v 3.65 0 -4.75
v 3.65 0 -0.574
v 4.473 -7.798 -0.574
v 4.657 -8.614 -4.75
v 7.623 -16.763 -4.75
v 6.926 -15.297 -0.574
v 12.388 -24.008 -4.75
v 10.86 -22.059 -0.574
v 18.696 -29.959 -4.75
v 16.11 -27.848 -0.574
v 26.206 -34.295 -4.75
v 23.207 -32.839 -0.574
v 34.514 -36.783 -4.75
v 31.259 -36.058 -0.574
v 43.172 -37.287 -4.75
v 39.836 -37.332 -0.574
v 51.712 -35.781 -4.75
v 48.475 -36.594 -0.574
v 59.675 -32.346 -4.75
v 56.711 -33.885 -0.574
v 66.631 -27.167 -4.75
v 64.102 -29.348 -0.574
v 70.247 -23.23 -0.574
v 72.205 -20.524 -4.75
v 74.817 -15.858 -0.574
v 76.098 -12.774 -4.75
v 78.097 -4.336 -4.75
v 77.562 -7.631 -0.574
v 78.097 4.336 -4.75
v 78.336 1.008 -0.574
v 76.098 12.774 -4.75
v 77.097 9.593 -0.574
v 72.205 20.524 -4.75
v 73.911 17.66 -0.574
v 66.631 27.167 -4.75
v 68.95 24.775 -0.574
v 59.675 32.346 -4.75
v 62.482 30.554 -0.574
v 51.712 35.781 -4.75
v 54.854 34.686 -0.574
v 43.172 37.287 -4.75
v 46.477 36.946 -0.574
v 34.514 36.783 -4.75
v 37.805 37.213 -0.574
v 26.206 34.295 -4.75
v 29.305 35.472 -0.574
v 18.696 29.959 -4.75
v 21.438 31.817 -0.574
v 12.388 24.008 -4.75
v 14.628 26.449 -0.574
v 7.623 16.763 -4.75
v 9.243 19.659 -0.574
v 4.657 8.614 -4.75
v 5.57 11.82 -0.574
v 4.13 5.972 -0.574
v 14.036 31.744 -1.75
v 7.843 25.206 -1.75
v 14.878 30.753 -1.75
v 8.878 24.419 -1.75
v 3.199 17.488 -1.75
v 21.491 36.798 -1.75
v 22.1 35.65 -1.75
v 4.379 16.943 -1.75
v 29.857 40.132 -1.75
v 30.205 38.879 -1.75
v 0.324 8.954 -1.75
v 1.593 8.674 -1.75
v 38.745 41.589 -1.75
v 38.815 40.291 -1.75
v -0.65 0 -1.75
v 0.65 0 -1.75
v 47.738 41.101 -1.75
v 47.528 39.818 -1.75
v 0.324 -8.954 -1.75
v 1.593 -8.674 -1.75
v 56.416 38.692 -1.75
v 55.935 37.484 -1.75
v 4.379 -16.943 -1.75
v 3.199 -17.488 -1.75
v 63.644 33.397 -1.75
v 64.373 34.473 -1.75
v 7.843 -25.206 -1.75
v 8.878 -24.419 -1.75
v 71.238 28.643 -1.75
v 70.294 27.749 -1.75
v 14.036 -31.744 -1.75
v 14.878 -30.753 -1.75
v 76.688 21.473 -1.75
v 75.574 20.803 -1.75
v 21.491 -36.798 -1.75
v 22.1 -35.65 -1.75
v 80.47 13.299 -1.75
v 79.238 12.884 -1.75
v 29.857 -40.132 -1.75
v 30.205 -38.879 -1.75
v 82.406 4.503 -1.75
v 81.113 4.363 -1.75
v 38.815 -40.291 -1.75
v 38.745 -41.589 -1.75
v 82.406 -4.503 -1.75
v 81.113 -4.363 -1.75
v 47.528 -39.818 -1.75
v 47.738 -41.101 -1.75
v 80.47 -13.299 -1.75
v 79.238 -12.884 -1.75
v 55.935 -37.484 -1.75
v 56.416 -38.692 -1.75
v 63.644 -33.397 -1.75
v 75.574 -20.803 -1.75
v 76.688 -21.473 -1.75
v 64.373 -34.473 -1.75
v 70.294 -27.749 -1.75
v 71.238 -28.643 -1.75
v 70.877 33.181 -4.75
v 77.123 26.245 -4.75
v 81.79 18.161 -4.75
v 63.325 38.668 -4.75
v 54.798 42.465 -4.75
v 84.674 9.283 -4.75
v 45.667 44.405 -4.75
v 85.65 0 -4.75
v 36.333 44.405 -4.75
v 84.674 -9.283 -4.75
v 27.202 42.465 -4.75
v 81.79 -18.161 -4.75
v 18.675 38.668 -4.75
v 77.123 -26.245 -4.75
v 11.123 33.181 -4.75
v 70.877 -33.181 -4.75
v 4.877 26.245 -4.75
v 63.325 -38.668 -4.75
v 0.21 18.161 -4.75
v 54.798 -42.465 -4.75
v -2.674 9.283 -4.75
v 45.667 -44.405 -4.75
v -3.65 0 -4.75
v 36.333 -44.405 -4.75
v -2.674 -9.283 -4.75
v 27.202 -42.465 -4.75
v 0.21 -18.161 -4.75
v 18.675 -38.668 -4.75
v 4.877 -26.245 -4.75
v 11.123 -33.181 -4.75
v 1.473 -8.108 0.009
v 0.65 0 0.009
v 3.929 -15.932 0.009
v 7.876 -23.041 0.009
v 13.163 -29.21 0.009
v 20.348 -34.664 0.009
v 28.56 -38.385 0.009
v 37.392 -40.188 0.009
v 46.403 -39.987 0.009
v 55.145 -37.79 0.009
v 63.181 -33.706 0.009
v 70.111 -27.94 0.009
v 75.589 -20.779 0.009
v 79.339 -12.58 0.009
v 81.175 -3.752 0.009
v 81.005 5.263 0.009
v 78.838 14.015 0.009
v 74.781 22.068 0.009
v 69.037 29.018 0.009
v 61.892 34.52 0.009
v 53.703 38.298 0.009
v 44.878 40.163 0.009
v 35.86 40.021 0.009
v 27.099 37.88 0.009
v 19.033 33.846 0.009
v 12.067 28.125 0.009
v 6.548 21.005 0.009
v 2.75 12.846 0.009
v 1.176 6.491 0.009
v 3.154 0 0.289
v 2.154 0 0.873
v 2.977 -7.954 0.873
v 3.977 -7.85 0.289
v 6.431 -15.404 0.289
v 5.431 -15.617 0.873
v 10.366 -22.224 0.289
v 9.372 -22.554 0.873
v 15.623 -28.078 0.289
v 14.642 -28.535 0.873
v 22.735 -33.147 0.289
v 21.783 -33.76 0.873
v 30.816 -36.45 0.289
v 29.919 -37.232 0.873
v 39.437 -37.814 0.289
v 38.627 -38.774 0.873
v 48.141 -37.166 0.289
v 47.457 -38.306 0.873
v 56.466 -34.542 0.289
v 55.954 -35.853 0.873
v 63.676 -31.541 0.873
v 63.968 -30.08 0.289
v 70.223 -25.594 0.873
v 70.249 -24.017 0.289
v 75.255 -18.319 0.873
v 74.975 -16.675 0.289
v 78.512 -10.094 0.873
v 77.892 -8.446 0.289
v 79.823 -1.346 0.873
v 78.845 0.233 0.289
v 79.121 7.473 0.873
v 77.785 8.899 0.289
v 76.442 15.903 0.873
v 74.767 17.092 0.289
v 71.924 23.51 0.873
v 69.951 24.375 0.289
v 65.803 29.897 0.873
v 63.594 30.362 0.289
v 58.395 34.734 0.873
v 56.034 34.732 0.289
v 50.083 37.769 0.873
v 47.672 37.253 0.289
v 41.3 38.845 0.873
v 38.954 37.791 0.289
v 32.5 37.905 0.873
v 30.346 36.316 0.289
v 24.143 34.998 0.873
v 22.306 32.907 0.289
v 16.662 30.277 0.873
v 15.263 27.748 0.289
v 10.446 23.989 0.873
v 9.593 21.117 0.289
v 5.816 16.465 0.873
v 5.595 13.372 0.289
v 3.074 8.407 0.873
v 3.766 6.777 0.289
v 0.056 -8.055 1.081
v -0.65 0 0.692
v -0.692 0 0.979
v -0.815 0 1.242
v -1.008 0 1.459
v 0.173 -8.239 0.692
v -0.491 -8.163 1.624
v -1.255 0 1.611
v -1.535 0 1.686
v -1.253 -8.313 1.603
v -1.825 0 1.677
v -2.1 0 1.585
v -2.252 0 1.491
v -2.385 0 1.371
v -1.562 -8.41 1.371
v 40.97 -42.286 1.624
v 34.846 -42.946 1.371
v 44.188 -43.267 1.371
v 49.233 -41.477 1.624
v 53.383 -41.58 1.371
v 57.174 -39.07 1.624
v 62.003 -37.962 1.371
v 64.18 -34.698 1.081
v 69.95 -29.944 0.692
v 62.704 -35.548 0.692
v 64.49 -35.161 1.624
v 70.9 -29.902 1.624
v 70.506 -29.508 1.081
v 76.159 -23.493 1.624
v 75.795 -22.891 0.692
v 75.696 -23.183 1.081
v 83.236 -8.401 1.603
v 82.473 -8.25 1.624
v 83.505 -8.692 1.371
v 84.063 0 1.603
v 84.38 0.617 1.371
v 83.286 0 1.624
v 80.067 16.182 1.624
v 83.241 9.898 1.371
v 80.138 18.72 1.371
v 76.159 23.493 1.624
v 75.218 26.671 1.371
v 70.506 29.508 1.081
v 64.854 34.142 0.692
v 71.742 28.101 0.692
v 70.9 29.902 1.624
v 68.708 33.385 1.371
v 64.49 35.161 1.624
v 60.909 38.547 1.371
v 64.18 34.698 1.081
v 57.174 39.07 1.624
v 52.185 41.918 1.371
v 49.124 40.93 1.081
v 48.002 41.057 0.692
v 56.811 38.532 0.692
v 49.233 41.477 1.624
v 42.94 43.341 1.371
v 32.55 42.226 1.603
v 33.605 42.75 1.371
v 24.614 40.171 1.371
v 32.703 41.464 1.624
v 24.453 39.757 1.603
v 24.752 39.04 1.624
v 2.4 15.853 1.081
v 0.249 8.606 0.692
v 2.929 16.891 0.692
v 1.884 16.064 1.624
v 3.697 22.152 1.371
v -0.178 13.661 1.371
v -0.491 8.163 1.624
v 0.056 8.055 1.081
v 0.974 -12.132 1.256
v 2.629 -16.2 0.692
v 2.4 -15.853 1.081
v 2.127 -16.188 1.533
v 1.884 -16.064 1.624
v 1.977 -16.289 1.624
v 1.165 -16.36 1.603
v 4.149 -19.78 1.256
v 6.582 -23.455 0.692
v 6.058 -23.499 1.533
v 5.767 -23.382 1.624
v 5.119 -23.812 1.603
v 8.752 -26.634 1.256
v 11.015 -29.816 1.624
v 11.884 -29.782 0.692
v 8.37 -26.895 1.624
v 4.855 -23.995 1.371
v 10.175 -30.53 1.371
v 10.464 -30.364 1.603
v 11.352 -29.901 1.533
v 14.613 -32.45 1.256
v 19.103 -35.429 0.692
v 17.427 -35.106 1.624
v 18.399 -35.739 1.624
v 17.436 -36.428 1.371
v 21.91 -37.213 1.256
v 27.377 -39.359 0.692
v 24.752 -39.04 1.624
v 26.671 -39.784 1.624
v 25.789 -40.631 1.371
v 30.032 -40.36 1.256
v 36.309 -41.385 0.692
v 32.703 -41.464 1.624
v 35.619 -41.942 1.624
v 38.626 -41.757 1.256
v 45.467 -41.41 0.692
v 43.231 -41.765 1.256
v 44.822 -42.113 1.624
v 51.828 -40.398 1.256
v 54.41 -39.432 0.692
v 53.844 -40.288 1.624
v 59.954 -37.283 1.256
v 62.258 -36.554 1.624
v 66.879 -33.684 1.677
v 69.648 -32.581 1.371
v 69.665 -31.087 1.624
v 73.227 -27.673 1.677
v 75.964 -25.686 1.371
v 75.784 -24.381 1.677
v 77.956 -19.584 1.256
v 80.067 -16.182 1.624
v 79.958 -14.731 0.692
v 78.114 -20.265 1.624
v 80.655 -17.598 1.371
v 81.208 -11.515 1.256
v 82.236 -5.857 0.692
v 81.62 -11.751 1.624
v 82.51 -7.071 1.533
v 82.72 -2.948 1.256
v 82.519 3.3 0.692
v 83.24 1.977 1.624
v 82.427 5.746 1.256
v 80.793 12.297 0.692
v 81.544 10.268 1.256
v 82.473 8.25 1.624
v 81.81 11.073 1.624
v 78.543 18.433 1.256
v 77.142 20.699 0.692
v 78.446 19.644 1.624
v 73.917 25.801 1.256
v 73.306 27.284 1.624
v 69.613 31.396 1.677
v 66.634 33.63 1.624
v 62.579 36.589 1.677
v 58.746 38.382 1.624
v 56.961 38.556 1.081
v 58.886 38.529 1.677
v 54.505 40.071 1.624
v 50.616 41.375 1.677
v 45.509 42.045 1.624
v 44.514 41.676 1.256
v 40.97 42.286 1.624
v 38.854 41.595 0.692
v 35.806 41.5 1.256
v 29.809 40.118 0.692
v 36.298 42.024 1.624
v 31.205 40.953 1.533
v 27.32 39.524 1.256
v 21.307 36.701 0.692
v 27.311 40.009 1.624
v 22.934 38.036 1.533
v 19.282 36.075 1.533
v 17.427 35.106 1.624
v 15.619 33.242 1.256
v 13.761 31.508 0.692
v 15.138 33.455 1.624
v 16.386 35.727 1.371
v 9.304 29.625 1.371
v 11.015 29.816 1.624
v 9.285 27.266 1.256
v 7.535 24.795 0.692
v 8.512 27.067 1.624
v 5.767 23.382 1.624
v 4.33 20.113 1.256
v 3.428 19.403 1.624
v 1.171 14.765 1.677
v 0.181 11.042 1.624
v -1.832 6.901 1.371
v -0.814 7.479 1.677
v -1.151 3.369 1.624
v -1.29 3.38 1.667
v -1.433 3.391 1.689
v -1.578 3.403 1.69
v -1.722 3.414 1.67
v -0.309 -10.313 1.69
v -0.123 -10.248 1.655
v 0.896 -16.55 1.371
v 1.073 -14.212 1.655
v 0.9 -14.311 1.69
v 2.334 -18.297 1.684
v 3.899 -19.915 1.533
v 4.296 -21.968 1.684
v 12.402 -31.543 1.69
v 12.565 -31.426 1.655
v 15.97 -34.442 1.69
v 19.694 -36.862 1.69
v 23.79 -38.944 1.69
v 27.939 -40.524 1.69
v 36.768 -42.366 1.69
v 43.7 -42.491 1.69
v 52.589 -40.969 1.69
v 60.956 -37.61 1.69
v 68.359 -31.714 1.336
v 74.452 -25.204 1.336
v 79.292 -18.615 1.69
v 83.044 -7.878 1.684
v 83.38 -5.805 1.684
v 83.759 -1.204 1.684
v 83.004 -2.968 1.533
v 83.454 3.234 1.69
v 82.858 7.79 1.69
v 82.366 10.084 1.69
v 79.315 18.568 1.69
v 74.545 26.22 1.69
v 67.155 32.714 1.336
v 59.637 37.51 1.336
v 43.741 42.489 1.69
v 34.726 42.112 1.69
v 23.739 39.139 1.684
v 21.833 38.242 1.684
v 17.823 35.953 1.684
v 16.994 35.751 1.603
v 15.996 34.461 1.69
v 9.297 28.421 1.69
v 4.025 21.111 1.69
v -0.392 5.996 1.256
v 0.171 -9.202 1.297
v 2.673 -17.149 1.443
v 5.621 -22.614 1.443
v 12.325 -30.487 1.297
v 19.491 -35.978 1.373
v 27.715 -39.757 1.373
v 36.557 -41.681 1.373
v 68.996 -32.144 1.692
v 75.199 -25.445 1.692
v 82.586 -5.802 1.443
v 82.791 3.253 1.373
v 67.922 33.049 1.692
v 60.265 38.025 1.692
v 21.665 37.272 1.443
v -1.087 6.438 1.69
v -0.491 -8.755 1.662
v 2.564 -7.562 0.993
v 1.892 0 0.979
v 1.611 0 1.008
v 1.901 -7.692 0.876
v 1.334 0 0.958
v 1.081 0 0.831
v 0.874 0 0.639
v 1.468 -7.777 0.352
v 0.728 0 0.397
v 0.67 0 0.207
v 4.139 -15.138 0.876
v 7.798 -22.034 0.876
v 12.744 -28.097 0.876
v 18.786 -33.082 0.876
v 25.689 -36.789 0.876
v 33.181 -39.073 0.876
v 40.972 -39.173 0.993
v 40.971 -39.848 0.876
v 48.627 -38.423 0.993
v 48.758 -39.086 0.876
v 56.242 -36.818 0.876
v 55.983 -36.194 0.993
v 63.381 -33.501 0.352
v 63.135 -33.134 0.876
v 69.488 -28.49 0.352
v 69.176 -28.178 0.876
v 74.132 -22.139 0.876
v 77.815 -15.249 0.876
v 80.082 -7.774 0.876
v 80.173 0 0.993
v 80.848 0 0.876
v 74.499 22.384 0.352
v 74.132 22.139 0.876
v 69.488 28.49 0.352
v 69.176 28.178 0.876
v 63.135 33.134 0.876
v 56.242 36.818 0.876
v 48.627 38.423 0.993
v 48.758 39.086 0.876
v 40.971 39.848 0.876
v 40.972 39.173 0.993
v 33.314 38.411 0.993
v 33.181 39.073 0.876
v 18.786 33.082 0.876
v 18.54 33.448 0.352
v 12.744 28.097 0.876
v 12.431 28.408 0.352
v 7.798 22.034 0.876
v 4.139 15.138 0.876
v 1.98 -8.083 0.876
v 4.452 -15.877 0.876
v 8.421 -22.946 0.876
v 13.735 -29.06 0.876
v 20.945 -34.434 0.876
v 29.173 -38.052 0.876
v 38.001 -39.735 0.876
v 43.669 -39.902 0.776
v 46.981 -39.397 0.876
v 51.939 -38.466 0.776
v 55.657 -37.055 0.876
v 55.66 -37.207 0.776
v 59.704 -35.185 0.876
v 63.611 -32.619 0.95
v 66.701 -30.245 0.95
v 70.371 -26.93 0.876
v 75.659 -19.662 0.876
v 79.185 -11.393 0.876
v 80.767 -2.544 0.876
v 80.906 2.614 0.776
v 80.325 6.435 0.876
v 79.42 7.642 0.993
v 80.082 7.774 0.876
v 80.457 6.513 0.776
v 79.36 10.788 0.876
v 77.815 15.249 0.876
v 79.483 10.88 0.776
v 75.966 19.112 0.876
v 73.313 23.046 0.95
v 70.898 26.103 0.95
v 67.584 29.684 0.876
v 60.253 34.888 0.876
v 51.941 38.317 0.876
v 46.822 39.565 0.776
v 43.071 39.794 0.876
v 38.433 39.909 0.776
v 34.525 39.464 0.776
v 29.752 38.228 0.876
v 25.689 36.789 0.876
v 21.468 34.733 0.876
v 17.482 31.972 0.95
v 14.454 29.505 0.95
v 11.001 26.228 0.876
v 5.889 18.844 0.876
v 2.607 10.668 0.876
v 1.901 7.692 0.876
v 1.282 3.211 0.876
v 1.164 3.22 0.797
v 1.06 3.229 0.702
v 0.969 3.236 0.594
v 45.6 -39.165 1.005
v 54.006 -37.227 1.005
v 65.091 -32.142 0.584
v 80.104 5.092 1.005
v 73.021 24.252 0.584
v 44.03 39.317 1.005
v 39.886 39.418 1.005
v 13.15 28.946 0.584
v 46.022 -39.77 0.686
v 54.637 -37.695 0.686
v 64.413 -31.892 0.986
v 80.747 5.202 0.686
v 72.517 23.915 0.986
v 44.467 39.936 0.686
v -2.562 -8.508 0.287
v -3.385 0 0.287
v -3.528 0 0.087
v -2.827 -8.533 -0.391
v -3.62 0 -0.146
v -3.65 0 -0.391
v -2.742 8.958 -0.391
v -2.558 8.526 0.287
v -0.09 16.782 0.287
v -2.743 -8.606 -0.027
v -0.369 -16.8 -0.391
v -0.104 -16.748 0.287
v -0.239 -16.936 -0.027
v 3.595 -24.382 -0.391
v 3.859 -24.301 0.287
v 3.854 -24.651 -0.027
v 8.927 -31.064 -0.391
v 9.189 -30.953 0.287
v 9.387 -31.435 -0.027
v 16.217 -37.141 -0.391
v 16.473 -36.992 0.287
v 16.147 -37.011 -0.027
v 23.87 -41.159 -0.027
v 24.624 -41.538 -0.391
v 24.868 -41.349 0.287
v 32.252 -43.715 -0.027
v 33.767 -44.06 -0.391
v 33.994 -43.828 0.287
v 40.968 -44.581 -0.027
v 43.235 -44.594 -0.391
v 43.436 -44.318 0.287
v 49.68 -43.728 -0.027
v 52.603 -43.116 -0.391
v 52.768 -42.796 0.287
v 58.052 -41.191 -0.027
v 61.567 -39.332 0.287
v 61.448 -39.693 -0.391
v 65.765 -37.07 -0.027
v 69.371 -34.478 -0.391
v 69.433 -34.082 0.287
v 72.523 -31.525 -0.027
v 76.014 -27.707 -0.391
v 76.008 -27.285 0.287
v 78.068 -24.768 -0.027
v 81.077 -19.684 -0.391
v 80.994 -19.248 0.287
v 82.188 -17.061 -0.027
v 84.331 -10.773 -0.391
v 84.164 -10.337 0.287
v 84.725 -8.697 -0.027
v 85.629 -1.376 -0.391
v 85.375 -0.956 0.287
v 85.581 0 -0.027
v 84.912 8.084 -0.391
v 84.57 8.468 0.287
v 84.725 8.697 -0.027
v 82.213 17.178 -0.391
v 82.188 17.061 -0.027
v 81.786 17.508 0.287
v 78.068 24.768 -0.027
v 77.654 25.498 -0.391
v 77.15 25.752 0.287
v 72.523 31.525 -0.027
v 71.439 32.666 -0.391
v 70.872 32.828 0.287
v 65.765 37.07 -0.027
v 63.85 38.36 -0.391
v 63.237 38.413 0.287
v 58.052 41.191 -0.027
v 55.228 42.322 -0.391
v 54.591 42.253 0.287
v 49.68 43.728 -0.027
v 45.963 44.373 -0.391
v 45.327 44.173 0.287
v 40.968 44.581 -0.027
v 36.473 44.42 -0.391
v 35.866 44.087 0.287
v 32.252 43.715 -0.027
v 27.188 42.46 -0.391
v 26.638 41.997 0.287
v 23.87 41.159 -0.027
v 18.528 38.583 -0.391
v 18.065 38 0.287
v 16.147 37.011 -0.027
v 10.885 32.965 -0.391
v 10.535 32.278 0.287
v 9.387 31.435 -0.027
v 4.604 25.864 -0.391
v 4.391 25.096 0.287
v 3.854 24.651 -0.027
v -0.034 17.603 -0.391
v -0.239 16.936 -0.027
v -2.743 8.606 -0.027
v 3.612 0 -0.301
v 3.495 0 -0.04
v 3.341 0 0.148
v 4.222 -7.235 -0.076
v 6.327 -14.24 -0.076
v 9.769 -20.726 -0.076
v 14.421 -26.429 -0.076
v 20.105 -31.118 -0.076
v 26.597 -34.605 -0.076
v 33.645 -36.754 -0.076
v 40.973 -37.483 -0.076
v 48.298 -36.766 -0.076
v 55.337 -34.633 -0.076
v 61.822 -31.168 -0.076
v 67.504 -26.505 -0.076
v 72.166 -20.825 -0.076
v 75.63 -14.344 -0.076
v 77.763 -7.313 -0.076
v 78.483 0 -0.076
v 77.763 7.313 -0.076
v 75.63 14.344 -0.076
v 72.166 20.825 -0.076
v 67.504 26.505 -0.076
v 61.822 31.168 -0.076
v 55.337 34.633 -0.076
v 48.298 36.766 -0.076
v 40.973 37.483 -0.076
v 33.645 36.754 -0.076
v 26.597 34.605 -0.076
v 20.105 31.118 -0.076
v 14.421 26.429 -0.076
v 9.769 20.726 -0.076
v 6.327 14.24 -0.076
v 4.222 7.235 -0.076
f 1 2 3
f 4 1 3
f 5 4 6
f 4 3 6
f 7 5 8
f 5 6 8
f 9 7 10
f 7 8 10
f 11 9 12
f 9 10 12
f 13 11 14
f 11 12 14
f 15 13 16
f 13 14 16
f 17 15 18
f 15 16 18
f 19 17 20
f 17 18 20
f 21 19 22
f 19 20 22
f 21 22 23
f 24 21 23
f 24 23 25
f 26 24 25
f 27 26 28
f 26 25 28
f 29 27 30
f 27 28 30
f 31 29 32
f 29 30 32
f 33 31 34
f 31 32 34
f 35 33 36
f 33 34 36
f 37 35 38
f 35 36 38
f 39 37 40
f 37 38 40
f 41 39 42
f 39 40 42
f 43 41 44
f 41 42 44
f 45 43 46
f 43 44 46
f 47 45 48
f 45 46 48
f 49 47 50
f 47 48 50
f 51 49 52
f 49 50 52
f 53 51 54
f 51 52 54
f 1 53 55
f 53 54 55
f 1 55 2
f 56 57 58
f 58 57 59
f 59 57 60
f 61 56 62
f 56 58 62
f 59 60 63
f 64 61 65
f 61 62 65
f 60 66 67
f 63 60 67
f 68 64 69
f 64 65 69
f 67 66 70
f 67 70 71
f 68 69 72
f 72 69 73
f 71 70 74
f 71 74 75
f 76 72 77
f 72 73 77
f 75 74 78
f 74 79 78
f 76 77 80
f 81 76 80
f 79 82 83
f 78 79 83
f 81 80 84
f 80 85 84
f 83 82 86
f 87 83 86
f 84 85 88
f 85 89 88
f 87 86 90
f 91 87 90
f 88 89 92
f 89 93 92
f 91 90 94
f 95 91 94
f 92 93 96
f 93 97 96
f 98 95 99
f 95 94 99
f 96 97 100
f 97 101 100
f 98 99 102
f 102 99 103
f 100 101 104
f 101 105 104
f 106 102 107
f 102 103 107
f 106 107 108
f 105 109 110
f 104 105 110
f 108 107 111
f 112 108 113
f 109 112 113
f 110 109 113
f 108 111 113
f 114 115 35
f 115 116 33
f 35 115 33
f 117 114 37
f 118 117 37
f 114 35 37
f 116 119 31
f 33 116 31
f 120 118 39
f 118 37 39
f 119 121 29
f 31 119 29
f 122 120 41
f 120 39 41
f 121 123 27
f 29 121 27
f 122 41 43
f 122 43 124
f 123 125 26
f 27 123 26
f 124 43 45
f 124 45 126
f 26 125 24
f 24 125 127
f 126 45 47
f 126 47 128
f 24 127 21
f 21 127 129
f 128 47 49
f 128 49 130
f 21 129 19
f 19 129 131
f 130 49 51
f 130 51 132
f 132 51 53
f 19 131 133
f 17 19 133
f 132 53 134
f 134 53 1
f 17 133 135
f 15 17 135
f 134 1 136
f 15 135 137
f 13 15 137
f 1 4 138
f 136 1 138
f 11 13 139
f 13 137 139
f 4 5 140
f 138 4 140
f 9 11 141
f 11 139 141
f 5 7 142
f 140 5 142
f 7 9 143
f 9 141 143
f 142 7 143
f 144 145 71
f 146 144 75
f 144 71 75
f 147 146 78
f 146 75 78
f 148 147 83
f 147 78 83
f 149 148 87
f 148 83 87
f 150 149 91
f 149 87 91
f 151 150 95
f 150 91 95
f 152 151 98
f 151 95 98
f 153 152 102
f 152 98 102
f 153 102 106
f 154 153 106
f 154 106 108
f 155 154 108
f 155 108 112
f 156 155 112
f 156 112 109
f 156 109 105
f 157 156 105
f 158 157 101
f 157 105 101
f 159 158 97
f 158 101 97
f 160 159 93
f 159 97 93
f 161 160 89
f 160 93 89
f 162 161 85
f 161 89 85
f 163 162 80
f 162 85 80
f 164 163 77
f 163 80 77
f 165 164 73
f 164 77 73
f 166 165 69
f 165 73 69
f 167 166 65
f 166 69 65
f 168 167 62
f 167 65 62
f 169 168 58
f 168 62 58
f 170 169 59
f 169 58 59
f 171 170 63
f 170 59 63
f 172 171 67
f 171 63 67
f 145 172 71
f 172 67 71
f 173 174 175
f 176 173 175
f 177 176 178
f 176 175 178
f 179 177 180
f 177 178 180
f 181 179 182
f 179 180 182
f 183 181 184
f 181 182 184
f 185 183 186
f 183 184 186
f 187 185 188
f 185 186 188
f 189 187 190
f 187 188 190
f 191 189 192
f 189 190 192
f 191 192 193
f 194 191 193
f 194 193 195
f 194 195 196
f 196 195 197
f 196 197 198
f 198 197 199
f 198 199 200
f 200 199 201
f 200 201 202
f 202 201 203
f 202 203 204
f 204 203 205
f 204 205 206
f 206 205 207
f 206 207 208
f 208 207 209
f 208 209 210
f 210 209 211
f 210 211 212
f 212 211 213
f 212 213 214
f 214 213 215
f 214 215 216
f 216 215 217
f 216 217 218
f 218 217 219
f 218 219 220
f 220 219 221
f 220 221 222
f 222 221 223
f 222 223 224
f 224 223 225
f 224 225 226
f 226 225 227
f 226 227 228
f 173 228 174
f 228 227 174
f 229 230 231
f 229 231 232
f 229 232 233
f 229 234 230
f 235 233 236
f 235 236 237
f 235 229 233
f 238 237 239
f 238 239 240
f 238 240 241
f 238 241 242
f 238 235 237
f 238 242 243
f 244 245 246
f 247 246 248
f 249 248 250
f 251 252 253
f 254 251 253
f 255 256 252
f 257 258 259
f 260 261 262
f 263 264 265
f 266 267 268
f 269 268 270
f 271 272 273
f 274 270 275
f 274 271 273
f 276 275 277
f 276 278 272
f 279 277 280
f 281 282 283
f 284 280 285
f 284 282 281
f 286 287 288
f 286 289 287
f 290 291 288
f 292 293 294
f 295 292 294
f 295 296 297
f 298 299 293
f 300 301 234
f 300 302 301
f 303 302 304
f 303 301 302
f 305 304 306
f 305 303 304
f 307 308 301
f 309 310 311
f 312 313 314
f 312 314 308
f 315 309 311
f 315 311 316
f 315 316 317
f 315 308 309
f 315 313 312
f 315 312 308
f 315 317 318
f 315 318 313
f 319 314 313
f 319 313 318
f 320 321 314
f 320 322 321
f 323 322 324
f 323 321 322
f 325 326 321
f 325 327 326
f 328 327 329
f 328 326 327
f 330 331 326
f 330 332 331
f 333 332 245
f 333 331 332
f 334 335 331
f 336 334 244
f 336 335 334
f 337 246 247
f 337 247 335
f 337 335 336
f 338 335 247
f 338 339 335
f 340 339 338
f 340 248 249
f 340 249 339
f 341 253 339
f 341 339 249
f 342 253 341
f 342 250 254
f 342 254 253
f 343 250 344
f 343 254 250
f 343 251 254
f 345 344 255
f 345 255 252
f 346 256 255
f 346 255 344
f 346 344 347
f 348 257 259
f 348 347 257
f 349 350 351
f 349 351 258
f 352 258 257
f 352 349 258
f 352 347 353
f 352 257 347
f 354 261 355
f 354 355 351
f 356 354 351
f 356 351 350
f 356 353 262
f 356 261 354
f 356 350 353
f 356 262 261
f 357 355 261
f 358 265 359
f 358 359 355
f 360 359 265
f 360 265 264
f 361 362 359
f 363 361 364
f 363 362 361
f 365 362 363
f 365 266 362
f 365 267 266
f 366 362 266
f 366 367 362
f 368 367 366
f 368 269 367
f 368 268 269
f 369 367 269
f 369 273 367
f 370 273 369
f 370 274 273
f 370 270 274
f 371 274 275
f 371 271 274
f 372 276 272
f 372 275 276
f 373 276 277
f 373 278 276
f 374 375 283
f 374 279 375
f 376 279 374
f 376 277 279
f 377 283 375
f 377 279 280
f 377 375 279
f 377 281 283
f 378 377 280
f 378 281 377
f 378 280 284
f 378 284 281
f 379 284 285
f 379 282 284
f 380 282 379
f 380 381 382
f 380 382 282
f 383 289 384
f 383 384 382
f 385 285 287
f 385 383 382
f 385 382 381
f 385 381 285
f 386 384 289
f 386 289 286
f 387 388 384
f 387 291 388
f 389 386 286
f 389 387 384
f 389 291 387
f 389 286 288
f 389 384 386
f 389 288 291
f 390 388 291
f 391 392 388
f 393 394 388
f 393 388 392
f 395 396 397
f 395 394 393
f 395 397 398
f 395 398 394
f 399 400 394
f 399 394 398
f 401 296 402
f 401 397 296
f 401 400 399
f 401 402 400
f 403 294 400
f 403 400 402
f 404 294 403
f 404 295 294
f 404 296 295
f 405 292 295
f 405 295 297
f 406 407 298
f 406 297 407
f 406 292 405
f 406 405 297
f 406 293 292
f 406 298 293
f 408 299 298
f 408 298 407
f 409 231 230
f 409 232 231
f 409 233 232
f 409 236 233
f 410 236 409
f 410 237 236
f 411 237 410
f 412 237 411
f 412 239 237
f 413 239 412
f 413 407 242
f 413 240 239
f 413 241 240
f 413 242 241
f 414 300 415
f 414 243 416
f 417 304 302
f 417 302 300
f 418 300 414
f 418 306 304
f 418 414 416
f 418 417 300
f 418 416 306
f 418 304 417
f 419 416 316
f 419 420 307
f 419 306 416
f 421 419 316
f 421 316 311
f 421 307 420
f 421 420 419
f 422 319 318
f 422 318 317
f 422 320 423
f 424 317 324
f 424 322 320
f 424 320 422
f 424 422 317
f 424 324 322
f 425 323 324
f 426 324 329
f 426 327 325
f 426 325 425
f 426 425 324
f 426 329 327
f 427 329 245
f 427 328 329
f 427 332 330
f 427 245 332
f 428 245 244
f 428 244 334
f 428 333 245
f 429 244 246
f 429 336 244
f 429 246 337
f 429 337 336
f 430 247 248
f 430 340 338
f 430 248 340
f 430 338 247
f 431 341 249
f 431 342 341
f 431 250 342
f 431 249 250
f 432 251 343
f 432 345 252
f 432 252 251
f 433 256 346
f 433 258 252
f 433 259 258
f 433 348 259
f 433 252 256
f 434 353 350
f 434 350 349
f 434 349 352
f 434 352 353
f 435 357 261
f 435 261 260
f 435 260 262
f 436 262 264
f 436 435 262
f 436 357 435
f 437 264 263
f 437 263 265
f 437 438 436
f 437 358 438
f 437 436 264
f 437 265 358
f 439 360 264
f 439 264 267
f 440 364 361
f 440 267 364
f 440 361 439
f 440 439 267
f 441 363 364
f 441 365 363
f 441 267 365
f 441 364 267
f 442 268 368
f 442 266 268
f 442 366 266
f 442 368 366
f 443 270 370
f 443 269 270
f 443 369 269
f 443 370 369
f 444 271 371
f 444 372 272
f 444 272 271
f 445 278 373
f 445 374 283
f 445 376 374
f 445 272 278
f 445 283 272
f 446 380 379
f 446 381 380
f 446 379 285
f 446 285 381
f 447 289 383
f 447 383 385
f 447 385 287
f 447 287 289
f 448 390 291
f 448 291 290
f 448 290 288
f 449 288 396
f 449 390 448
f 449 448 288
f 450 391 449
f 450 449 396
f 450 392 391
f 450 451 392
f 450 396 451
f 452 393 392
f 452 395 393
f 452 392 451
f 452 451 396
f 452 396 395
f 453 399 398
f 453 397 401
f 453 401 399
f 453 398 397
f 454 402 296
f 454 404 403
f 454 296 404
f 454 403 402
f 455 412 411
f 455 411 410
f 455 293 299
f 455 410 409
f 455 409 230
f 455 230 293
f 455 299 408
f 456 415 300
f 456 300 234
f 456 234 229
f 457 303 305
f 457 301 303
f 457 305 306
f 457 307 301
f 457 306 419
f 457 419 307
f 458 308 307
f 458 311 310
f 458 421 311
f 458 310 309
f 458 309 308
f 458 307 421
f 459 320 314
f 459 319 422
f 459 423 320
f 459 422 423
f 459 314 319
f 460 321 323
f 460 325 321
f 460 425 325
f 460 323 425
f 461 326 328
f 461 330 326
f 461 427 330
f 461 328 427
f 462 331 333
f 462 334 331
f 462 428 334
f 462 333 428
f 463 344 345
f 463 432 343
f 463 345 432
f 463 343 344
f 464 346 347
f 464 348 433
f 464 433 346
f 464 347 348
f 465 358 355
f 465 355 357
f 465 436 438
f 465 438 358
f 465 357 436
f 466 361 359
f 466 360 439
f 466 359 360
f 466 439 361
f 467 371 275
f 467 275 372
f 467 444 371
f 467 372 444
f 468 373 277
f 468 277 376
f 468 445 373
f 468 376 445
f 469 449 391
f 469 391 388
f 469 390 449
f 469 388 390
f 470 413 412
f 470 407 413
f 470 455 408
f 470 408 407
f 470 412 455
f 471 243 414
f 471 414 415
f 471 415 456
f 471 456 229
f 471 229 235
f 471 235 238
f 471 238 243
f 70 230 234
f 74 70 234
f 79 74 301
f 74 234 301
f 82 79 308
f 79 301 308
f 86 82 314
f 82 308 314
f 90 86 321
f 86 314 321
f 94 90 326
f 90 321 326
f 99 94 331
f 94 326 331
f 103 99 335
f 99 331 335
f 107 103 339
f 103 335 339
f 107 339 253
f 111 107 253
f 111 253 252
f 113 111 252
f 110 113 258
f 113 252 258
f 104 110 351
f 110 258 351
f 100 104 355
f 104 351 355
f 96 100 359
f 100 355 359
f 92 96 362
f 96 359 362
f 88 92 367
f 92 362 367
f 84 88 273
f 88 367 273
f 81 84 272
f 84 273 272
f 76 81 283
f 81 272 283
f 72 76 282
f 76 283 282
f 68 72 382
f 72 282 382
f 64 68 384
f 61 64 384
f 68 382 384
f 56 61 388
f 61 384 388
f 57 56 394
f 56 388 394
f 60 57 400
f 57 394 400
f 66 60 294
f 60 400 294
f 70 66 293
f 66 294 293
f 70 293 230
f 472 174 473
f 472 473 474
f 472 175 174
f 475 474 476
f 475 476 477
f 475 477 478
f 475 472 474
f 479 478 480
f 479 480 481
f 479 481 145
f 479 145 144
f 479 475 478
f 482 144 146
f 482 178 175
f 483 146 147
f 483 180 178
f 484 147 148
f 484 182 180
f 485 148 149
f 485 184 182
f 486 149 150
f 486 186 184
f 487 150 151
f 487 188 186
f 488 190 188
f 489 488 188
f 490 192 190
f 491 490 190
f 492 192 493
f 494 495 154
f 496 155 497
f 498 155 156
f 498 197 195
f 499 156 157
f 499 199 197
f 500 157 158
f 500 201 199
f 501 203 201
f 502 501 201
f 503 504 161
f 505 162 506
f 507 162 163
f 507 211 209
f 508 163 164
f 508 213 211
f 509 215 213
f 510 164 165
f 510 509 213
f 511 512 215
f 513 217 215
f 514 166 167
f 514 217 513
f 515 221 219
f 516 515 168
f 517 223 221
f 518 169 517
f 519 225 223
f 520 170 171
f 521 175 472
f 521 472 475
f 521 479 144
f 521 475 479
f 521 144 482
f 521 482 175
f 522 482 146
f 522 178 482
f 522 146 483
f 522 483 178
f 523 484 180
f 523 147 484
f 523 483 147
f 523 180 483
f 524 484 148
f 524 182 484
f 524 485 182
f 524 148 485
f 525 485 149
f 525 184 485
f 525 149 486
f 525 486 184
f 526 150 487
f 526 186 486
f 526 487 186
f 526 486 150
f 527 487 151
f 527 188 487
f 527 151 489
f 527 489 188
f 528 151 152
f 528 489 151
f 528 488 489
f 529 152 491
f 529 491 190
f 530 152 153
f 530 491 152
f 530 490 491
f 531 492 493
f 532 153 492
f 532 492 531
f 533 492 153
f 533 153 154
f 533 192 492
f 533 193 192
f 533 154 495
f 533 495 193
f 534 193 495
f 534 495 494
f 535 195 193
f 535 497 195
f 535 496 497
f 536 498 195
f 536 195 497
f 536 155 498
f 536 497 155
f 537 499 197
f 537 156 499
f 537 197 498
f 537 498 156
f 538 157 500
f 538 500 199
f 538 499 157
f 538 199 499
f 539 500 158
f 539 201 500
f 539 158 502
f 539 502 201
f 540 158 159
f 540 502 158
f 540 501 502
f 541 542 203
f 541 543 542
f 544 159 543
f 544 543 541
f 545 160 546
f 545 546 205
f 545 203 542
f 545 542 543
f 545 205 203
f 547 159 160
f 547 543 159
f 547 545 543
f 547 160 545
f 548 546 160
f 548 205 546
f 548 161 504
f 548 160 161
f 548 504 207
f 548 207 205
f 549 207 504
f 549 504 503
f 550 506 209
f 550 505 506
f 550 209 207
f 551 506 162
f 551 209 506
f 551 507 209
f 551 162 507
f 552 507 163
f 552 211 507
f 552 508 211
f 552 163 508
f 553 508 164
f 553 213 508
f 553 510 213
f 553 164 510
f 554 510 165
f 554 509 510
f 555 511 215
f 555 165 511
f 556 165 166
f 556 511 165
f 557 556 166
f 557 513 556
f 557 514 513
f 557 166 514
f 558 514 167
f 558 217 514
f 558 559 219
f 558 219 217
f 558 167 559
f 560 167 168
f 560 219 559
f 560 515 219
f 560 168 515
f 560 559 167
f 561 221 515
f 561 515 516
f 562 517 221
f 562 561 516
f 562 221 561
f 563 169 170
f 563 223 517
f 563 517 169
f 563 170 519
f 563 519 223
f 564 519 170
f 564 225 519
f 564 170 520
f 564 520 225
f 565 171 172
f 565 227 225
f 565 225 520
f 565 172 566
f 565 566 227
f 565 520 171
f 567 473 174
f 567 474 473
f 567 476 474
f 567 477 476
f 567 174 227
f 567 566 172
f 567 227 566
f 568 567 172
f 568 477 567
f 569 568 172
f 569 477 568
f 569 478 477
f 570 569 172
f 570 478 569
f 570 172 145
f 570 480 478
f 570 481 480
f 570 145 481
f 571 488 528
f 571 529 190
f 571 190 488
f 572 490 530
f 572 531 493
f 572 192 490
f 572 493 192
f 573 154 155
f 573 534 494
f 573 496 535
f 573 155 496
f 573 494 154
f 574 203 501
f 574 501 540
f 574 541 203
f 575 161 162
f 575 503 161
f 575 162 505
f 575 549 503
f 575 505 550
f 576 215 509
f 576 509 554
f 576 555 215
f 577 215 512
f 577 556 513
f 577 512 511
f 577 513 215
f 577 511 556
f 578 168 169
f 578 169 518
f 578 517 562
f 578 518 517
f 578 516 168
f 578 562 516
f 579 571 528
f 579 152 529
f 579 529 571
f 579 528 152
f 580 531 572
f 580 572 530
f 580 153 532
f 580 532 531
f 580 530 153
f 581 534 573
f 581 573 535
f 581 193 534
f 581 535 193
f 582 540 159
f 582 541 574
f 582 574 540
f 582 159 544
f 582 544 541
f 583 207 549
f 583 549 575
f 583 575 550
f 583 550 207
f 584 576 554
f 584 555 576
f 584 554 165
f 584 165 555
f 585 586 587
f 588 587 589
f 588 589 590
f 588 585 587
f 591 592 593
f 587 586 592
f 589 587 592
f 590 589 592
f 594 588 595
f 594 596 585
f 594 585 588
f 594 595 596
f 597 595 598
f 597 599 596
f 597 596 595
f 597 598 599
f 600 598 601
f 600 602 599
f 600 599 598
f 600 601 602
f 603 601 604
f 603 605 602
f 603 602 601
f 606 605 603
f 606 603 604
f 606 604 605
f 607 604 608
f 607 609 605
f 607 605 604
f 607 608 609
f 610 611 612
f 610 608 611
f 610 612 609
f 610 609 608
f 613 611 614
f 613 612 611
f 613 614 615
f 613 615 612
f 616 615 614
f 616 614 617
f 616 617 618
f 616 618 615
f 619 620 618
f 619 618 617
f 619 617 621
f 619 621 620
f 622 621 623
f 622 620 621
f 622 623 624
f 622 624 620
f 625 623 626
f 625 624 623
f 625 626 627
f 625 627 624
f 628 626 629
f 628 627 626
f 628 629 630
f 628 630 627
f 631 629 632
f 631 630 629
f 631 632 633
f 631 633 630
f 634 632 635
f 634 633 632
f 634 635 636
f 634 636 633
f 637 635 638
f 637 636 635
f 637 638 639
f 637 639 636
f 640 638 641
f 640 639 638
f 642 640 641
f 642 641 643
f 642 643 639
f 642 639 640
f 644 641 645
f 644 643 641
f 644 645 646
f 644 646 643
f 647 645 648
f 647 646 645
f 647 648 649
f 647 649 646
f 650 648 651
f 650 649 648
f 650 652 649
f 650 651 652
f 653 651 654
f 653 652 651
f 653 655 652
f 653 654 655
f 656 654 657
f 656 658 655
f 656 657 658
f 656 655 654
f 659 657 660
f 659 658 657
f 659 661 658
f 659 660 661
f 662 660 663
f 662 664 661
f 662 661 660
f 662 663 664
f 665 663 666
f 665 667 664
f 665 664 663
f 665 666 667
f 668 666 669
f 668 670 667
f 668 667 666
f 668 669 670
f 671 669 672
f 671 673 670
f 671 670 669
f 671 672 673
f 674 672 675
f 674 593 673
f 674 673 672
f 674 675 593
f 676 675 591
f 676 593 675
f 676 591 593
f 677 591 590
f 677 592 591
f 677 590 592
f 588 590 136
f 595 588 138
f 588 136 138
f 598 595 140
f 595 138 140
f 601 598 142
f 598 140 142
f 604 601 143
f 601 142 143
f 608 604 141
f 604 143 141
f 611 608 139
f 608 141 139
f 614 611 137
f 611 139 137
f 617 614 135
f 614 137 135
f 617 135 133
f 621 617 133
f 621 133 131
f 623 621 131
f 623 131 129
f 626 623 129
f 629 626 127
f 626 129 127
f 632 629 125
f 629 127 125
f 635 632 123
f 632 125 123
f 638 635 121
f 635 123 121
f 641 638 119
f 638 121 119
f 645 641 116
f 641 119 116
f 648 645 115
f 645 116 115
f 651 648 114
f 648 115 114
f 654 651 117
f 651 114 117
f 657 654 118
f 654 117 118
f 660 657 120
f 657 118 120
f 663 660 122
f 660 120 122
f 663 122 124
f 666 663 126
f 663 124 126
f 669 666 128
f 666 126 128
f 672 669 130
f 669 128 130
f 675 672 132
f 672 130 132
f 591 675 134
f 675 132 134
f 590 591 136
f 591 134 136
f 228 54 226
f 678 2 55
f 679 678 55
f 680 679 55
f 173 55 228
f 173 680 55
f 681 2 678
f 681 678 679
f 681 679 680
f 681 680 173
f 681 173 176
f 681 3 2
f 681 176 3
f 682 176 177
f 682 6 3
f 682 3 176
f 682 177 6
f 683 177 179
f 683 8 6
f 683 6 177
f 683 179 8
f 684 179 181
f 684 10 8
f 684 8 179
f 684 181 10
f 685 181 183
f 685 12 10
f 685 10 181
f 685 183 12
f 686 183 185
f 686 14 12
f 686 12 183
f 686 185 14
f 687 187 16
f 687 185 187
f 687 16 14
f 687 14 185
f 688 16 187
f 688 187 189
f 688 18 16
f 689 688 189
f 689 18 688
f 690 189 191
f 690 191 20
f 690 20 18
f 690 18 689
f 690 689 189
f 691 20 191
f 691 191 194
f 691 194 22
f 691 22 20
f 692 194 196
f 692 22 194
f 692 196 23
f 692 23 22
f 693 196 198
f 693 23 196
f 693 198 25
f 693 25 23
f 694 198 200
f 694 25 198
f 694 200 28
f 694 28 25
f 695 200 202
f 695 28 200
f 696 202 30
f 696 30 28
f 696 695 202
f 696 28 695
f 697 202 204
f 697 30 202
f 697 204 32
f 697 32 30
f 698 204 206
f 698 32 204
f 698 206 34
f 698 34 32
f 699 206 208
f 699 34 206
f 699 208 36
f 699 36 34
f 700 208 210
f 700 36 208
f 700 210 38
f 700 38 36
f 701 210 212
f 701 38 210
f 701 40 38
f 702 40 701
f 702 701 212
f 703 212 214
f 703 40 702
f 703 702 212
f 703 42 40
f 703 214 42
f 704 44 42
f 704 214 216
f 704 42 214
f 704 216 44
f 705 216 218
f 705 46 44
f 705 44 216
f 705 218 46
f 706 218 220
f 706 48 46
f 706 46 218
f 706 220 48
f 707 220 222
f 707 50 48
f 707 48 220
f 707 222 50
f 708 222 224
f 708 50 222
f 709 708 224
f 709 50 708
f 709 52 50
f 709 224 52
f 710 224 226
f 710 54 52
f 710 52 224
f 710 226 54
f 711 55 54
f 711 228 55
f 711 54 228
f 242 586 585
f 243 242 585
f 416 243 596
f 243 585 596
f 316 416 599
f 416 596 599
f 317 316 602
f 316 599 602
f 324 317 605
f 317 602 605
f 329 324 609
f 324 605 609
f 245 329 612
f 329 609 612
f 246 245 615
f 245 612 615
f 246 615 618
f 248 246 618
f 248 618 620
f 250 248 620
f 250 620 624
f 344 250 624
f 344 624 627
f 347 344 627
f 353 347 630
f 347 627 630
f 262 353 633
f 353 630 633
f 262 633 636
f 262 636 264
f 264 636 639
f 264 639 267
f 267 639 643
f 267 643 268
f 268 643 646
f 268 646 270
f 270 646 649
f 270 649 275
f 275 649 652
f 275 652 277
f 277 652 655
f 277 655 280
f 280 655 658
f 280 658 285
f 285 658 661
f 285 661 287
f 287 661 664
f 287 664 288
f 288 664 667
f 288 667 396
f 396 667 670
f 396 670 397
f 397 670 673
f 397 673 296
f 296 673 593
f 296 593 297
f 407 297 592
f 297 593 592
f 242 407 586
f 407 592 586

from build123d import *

# Parameters (mm, degrees)
FILLET_R = 1


with BuildPart() as part:
    # Sketch → Revolve (revolve)
    with BuildSketch(Plane.XZ):
        Polygon((-3.65, -4.75), (3.65, -4.75), (3.65, 0), (0.65, 1.75), (0.65, -1.75), (-0.65, -1.75), (-0.65, 3.25), (-3.65, 0), align=None)
    revolve(axis=Axis((41, 0, 0), (0, 0, 1)))

    # Fillet
    fillet_edges = [part.edges().sort_by_distance(p)[0] for p in [
        (78.35, 0, 0),
        (81.35, 0, 1.75),
        (82.65, 0, 3.25),
        (85.65, 0, 0),
    ]]
    fillet(fillet_edges, radius=FILLET_R)


solid = part.part
